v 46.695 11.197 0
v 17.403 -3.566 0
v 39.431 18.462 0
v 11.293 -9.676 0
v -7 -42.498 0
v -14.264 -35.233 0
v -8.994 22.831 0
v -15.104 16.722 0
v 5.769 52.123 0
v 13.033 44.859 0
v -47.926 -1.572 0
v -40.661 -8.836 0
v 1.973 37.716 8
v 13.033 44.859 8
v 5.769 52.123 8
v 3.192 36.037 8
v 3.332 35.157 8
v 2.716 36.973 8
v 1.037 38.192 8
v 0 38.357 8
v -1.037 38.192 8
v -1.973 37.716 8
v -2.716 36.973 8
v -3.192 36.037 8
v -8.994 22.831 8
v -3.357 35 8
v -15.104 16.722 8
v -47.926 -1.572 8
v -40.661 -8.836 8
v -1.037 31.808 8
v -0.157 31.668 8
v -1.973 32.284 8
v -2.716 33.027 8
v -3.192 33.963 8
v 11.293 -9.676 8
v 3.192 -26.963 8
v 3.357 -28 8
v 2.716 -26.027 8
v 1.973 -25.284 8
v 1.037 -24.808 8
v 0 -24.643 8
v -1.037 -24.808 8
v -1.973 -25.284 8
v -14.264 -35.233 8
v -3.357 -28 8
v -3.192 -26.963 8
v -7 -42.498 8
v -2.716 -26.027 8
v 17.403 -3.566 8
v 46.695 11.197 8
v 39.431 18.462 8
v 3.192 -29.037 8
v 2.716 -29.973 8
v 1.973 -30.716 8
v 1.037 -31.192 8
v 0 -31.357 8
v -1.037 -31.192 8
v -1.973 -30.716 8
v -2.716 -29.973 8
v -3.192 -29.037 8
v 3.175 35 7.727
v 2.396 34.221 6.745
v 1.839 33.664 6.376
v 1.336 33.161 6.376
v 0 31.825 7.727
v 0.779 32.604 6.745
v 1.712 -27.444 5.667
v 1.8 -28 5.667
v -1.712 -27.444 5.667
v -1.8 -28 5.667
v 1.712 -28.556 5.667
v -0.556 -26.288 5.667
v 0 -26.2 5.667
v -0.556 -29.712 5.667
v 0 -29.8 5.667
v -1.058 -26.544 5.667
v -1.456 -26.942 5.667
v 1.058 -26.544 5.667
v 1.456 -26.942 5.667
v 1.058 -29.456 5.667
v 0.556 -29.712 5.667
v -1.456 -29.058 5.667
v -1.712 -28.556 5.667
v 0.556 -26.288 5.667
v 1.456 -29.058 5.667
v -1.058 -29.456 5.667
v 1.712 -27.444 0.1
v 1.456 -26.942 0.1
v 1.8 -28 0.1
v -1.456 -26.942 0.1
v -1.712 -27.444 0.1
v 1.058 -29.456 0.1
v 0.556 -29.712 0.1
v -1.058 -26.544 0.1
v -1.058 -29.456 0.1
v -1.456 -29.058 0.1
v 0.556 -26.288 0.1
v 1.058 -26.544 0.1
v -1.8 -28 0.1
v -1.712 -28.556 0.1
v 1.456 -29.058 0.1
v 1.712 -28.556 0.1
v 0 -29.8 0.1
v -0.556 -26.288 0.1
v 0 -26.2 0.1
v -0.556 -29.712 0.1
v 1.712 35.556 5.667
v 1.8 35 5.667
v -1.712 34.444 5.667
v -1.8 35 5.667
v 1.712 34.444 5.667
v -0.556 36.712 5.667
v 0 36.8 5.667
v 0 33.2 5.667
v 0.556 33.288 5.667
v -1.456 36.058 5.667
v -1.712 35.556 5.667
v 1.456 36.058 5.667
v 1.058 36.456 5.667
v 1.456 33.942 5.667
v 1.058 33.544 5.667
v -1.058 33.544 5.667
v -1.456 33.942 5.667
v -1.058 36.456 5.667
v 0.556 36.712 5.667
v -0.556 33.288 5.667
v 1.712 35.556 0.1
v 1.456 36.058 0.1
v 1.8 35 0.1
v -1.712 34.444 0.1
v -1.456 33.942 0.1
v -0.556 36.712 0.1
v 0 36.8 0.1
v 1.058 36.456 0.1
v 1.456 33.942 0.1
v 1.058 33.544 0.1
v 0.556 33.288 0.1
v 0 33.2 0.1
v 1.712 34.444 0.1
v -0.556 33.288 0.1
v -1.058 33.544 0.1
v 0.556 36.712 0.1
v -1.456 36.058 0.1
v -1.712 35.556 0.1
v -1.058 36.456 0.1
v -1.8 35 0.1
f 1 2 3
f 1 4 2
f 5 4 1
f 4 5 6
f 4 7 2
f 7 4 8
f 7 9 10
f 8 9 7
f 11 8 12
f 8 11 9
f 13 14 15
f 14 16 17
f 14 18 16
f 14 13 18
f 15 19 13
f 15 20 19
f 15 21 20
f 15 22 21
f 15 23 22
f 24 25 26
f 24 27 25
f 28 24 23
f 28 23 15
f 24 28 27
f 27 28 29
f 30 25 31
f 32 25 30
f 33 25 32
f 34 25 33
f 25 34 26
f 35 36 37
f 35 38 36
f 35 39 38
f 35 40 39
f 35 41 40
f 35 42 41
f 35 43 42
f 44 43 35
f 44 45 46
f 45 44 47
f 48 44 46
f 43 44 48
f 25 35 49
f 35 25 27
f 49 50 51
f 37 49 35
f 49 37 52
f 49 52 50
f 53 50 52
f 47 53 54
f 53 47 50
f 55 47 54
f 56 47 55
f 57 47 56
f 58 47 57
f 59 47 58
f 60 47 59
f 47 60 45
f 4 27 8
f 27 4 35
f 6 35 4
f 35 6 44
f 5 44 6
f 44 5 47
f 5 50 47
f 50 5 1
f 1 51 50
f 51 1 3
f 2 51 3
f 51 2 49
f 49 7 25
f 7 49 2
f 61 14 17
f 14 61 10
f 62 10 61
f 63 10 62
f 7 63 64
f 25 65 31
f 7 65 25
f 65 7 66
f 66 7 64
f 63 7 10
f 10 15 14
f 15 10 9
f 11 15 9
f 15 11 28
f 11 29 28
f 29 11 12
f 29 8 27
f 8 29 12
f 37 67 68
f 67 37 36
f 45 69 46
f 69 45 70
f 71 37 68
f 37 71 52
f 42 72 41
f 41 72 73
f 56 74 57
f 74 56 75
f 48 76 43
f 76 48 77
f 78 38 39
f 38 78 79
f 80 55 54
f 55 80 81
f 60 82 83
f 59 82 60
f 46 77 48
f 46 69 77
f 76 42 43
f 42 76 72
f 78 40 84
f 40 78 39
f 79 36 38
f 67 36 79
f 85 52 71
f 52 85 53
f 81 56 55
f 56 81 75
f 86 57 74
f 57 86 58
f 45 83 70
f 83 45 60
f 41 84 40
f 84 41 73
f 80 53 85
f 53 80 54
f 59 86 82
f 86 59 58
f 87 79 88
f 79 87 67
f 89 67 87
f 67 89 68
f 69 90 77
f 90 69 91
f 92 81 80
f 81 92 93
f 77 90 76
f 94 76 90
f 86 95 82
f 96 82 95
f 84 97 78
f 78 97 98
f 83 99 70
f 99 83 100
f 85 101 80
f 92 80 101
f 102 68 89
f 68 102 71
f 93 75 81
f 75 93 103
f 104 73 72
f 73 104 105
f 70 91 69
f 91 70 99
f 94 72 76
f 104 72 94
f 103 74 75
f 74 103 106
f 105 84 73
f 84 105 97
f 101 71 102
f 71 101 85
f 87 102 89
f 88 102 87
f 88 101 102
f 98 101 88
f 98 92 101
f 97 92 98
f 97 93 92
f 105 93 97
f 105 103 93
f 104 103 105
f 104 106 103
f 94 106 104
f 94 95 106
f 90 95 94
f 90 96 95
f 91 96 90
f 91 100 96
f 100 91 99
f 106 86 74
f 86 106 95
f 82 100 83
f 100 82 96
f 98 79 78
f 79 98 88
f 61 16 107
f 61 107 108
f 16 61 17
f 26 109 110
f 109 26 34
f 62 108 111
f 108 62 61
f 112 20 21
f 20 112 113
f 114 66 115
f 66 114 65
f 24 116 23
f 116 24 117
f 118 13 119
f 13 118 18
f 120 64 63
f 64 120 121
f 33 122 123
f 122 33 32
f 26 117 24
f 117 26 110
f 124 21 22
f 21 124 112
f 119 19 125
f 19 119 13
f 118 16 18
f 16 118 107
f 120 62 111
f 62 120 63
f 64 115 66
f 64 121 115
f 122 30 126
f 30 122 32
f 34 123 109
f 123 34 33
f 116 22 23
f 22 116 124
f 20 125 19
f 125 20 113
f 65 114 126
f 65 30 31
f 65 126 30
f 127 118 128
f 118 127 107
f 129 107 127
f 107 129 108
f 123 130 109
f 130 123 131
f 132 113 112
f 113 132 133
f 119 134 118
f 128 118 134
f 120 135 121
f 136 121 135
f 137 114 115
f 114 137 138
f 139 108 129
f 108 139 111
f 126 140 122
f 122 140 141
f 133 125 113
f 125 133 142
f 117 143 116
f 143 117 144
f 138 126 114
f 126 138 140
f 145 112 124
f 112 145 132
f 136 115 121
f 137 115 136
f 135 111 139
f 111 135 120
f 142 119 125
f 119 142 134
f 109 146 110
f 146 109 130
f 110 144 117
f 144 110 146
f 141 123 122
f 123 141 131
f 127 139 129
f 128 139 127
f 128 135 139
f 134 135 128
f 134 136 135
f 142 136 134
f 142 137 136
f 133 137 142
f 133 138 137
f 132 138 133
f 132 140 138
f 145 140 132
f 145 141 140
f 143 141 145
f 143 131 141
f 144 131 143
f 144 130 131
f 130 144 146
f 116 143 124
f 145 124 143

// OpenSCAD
// Street Numbers for 3D printing
// Charles Tilford, 2019
// License: CC BY-NC-SA 4.0
//   https://creativecommons.org/licenses/by-nc-sa/4.0/

char="H";     // The number/letter to print

// Units are in mm, except for height of letter

// How many inches high should letter be?
inchesHigh=3;
// How thick/deep should letter be (mm)?
depth=8;

// Character coordinates just center the letter
charX=-43;    // Character X coord
charY=-35;    // Character Y coord
topScrew=35;  // Top screw Y coord
botScrew=-28; // Bottom screw Y coord
height=8;     // Thickness of character
// Screw dimensions. Default presumes
// #6 sheet metal screw
screwWid=3.6; // Width of screw shaft
screwTop=6.78;// Width of screw head
screwCon=5.08;// Height of head 'cone'

// Font to print in. Your system needs this
// installed, of course. If changed the hole
// positions almost certainly need to be
// changed, and maybe charX/charY.
fName="Open Sans Extrabold";
// https://fonts.google.com/specimen/Open+Sans
// Designer: Steve Matteson

// Thin floor below holes. My printer was
// struggling to have the hole 'border' stick
// to the stage. Just drill/screw thru it.
holeFloor=0.1; 

// ==========================================
// ===== All values below are auto-calculated
// ==========================================

// Scaled values
scaleFactor=inchesHigh / 3;
cX=charX * scaleFactor;
cY=charY * scaleFactor;
tS=topScrew * scaleFactor;
bS=botScrew * scaleFactor;
// Where do we start drawing screw head cone?
oS=depth - (screwCon-.05);

difference() {
  // We use difference() to punch out the screw holes
  // in the character
    
  // The character itself, 8mm thick
  // Rotating to put screws on different "arms"
  rotate(a=-45)
    translate([cX,cY,0])
    linear_extrude(height=depth, scale=1)
    text(char, size=(75*scaleFactor),
         $fn=100, font=fName);
    
  // Bottom screw hole
  translate([0,bS,oS]) color("red")
    cylinder(h=screwCon, d2=screwTop,
             d1=0, $fn=20);
   translate([0,bS,holeFloor])
    cylinder(h=20, d=screwWid, $fn=20);
    
  // Top screw hole
  translate([0,tS,oS]) color("red")
    cylinder(h=screwCon, d2=screwTop,
             d1=0, $fn=20);
  translate([0,tS,holeFloor])
    cylinder(h=20, d=screwWid, $fn=20);
}

// Colors are just to aid visualization of
// void spaces. $fn is "featuer number", ie how
// many polygons are devoted to object. The values
// above should be near your printing limit anyway.

// Developed in OpenSCAD
//    https://www.openscad.org/
